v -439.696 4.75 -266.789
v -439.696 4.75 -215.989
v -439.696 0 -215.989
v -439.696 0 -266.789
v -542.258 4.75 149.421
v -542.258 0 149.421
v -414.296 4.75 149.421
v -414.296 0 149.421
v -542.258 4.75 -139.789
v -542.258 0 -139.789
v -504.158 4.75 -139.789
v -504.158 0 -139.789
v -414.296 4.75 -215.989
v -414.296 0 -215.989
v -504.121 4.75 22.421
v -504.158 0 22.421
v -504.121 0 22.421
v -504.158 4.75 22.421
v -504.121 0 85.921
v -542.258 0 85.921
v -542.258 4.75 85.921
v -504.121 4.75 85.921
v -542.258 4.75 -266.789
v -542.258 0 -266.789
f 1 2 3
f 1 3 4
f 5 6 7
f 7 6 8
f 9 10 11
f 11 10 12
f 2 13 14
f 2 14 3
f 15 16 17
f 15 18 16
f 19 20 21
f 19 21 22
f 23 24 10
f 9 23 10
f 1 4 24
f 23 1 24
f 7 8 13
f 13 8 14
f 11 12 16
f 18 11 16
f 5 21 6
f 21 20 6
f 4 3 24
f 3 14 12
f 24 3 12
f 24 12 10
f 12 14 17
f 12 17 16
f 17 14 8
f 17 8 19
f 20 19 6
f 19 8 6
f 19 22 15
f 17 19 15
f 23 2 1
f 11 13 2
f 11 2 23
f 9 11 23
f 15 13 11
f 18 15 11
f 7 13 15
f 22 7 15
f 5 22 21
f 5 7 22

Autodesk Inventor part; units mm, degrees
ref_plane "YZ Plane" through (0, 0, 0) normal (1, 0, 0) x (0, 1, 0)
ref_plane "XZ Plane" through (0, 0, 0) normal (0, 1, 0) x (-1, 0, 0)
ref_plane "XY Plane" through (0, 0, 0) normal (0, 0, 1) x (1, 0, 0)
sketch "Sketch1" plane through (0, 0, 0) normal (0, 1, 0) x (-1, 0, 0)
  line L0 (542.2576, 149.421) -> (414.2963, 149.421)
  line L1 (414.2963, 149.421) -> (414.2963, -266.7891)
  line L2 (414.2963, -266.7891) -> (542.2576, -266.7891)
  line L3 (542.2576, -266.7891) -> (542.2576, 149.421)
  point P0 (0, 0)
extrude "Extrusion1" add sketch "Sketch1" along normal blind 4.7498
sketch "Sketch2" plane through (0, 0, 0) normal (0, -1, 0) x (1, 0, 0)
  point P0 (0, 0)
sketch "Sketch3" plane through (0, 0, 0) normal (0, -1, 0) x (1, 0, 0)
  line L0 (-542.2576, 149.421) -> (-414.2963, 149.421) projected
  line L1 (-542.2576, 149.421) -> (-542.2576, 22.421)
  line L2 (-542.2576, -266.7891) -> (-542.2576, 149.421) projected
  line L3 (-414.2963, -266.7891) -> (-542.2576, -266.7891) projected
  line L4 (-542.2576, -266.7891) -> (-542.2576, -139.7891)
  line L5 (-542.2576, -139.7891) -> (-504.1576, -139.7891)
  line L6 (-504.1576, -139.7891) -> (-504.1576, 22.421)
  line L7 (-504.1576, 22.421) -> (-542.2576, 22.421)
  line L8 (-504.1576, -139.7891) -> (-542.2576, -139.7891)
  line L9 (-542.2576, -139.7891) -> (-542.2576, 22.421)
  line L10 (-542.2576, 22.421) -> (-504.1576, 22.421)
  line L11 (-504.1576, 22.421) -> (-504.1576, -139.7891)
  point P0 (0, 0)
  dimension "d2" = 127
  dimension "d3" = 127
  dimension "d4" = 38.1
extrude "Extrusion2" cut sketch "Sketch3" against normal blind 65.0875
sketch "Sketch4" plane through (0, 0, 0) normal (0, -1, 0) x (1, 0, 0)
  point P0 (0, 0)
sketch "Sketch5" plane through (0, 0, 0) normal (0, -1, 0) x (1, 0, 0)
  line L0 (-542.2576, 22.421) -> (-542.2576, 85.921)
  line L1 (-542.2576, 22.421) -> (-542.2576, 149.421) projected
  line L2 (-510.2194, 85.921) -> (-510.2194, 22.421)
  line L3 (-542.2576, 22.421) -> (-504.1576, 22.421) projected
  line L4 (-542.2576, 85.921) -> (-510.2194, 85.921)
  point P0 (0, 0)
sketch "Sketch6" plane through (0, 0, 0) normal (0, -1, 0) x (1, 0, 0)
  point P0 (0, 0)
extrude "Extrusion3" cut sketch "Sketch5" against normal blind 123.825
sketch "Sketch7" plane through (0, 4.7498, 0) normal (0, 1, 0) x (1, 0, 0)
  line L0 (-414.2963, -149.421) -> (-414.2963, 266.7891) projected
  line L1 (-414.2963, 266.7891) -> (-433.3463, 266.7891)
  line L2 (-414.2963, 266.7891) -> (-542.2576, 266.7891) projected
  line L3 (-433.3463, 266.7891) -> (-433.3463, 215.9891)
  line L4 (-433.3463, 215.9891) -> (-414.2963, 215.9891)
  point P0 (0, 0)
  dimension "d9" = 19.05
  dimension "d11" = 50.8
extrude "Extrusion4" cut sketch "Sketch7" against normal blind 42.8625
sketch "Sketch8" plane through (0, 4.7498, 0) normal (0, 1, 0) x (1, 0, 0)
  line L0 (-510.2194, -22.421) -> (-504.1207, -22.421)
  line L1 (-504.1207, -22.421) -> (-504.1207, -85.7832)
  line L2 (-510.2194, -85.921) -> (-510.2194, -22.421) projected
  line L3 (-510.2194, -85.7832) -> (-510.2194, -22.421)
  line L4 (-542.2576, -85.921) -> (-510.2194, -85.921) projected
  line L5 (-510.2194, -85.7832) -> (-510.2194, -85.921)
  line L6 (-510.2194, -85.921) -> (-504.1207, -85.921)
  line L7 (-504.1207, -85.921) -> (-504.1207, -85.7832)
  point P0 (0, 0)
extrude "Extrusion5" cut sketch "Sketch8" against normal blind 28.575
sketch "Sketch9" plane through (0, 4.7498, 0) normal (0, 1, 0) x (1, 0, 0)
  point P0 (0, 0)
sketch "Sketch10" plane through (0, 4.7498, 0) normal (0, 1, 0) x (1, 0, 0)
  line L0 (-414.2963, 215.9891) -> (-433.3463, 215.9891) projected
  line L1 (-433.3463, 215.9891) -> (-439.6963, 215.9891)
  line L2 (-439.6963, 215.9891) -> (-439.6963, 266.7891)
  line L3 (-433.3463, 266.7891) -> (-542.2576, 266.7891) projected
  line L4 (-433.3463, 266.7891) -> (-433.3463, 215.9891) projected
  line L5 (-433.3463, 266.7891) -> (-433.3463, 215.9891)
  point P0 (0, 0)
  dimension "d16" = 6.35
extrude "Extrusion6" cut sketch "Sketch10" against normal blind 36.5125
properties part number "Lexan" material "Acetal Resin, White(1)"
